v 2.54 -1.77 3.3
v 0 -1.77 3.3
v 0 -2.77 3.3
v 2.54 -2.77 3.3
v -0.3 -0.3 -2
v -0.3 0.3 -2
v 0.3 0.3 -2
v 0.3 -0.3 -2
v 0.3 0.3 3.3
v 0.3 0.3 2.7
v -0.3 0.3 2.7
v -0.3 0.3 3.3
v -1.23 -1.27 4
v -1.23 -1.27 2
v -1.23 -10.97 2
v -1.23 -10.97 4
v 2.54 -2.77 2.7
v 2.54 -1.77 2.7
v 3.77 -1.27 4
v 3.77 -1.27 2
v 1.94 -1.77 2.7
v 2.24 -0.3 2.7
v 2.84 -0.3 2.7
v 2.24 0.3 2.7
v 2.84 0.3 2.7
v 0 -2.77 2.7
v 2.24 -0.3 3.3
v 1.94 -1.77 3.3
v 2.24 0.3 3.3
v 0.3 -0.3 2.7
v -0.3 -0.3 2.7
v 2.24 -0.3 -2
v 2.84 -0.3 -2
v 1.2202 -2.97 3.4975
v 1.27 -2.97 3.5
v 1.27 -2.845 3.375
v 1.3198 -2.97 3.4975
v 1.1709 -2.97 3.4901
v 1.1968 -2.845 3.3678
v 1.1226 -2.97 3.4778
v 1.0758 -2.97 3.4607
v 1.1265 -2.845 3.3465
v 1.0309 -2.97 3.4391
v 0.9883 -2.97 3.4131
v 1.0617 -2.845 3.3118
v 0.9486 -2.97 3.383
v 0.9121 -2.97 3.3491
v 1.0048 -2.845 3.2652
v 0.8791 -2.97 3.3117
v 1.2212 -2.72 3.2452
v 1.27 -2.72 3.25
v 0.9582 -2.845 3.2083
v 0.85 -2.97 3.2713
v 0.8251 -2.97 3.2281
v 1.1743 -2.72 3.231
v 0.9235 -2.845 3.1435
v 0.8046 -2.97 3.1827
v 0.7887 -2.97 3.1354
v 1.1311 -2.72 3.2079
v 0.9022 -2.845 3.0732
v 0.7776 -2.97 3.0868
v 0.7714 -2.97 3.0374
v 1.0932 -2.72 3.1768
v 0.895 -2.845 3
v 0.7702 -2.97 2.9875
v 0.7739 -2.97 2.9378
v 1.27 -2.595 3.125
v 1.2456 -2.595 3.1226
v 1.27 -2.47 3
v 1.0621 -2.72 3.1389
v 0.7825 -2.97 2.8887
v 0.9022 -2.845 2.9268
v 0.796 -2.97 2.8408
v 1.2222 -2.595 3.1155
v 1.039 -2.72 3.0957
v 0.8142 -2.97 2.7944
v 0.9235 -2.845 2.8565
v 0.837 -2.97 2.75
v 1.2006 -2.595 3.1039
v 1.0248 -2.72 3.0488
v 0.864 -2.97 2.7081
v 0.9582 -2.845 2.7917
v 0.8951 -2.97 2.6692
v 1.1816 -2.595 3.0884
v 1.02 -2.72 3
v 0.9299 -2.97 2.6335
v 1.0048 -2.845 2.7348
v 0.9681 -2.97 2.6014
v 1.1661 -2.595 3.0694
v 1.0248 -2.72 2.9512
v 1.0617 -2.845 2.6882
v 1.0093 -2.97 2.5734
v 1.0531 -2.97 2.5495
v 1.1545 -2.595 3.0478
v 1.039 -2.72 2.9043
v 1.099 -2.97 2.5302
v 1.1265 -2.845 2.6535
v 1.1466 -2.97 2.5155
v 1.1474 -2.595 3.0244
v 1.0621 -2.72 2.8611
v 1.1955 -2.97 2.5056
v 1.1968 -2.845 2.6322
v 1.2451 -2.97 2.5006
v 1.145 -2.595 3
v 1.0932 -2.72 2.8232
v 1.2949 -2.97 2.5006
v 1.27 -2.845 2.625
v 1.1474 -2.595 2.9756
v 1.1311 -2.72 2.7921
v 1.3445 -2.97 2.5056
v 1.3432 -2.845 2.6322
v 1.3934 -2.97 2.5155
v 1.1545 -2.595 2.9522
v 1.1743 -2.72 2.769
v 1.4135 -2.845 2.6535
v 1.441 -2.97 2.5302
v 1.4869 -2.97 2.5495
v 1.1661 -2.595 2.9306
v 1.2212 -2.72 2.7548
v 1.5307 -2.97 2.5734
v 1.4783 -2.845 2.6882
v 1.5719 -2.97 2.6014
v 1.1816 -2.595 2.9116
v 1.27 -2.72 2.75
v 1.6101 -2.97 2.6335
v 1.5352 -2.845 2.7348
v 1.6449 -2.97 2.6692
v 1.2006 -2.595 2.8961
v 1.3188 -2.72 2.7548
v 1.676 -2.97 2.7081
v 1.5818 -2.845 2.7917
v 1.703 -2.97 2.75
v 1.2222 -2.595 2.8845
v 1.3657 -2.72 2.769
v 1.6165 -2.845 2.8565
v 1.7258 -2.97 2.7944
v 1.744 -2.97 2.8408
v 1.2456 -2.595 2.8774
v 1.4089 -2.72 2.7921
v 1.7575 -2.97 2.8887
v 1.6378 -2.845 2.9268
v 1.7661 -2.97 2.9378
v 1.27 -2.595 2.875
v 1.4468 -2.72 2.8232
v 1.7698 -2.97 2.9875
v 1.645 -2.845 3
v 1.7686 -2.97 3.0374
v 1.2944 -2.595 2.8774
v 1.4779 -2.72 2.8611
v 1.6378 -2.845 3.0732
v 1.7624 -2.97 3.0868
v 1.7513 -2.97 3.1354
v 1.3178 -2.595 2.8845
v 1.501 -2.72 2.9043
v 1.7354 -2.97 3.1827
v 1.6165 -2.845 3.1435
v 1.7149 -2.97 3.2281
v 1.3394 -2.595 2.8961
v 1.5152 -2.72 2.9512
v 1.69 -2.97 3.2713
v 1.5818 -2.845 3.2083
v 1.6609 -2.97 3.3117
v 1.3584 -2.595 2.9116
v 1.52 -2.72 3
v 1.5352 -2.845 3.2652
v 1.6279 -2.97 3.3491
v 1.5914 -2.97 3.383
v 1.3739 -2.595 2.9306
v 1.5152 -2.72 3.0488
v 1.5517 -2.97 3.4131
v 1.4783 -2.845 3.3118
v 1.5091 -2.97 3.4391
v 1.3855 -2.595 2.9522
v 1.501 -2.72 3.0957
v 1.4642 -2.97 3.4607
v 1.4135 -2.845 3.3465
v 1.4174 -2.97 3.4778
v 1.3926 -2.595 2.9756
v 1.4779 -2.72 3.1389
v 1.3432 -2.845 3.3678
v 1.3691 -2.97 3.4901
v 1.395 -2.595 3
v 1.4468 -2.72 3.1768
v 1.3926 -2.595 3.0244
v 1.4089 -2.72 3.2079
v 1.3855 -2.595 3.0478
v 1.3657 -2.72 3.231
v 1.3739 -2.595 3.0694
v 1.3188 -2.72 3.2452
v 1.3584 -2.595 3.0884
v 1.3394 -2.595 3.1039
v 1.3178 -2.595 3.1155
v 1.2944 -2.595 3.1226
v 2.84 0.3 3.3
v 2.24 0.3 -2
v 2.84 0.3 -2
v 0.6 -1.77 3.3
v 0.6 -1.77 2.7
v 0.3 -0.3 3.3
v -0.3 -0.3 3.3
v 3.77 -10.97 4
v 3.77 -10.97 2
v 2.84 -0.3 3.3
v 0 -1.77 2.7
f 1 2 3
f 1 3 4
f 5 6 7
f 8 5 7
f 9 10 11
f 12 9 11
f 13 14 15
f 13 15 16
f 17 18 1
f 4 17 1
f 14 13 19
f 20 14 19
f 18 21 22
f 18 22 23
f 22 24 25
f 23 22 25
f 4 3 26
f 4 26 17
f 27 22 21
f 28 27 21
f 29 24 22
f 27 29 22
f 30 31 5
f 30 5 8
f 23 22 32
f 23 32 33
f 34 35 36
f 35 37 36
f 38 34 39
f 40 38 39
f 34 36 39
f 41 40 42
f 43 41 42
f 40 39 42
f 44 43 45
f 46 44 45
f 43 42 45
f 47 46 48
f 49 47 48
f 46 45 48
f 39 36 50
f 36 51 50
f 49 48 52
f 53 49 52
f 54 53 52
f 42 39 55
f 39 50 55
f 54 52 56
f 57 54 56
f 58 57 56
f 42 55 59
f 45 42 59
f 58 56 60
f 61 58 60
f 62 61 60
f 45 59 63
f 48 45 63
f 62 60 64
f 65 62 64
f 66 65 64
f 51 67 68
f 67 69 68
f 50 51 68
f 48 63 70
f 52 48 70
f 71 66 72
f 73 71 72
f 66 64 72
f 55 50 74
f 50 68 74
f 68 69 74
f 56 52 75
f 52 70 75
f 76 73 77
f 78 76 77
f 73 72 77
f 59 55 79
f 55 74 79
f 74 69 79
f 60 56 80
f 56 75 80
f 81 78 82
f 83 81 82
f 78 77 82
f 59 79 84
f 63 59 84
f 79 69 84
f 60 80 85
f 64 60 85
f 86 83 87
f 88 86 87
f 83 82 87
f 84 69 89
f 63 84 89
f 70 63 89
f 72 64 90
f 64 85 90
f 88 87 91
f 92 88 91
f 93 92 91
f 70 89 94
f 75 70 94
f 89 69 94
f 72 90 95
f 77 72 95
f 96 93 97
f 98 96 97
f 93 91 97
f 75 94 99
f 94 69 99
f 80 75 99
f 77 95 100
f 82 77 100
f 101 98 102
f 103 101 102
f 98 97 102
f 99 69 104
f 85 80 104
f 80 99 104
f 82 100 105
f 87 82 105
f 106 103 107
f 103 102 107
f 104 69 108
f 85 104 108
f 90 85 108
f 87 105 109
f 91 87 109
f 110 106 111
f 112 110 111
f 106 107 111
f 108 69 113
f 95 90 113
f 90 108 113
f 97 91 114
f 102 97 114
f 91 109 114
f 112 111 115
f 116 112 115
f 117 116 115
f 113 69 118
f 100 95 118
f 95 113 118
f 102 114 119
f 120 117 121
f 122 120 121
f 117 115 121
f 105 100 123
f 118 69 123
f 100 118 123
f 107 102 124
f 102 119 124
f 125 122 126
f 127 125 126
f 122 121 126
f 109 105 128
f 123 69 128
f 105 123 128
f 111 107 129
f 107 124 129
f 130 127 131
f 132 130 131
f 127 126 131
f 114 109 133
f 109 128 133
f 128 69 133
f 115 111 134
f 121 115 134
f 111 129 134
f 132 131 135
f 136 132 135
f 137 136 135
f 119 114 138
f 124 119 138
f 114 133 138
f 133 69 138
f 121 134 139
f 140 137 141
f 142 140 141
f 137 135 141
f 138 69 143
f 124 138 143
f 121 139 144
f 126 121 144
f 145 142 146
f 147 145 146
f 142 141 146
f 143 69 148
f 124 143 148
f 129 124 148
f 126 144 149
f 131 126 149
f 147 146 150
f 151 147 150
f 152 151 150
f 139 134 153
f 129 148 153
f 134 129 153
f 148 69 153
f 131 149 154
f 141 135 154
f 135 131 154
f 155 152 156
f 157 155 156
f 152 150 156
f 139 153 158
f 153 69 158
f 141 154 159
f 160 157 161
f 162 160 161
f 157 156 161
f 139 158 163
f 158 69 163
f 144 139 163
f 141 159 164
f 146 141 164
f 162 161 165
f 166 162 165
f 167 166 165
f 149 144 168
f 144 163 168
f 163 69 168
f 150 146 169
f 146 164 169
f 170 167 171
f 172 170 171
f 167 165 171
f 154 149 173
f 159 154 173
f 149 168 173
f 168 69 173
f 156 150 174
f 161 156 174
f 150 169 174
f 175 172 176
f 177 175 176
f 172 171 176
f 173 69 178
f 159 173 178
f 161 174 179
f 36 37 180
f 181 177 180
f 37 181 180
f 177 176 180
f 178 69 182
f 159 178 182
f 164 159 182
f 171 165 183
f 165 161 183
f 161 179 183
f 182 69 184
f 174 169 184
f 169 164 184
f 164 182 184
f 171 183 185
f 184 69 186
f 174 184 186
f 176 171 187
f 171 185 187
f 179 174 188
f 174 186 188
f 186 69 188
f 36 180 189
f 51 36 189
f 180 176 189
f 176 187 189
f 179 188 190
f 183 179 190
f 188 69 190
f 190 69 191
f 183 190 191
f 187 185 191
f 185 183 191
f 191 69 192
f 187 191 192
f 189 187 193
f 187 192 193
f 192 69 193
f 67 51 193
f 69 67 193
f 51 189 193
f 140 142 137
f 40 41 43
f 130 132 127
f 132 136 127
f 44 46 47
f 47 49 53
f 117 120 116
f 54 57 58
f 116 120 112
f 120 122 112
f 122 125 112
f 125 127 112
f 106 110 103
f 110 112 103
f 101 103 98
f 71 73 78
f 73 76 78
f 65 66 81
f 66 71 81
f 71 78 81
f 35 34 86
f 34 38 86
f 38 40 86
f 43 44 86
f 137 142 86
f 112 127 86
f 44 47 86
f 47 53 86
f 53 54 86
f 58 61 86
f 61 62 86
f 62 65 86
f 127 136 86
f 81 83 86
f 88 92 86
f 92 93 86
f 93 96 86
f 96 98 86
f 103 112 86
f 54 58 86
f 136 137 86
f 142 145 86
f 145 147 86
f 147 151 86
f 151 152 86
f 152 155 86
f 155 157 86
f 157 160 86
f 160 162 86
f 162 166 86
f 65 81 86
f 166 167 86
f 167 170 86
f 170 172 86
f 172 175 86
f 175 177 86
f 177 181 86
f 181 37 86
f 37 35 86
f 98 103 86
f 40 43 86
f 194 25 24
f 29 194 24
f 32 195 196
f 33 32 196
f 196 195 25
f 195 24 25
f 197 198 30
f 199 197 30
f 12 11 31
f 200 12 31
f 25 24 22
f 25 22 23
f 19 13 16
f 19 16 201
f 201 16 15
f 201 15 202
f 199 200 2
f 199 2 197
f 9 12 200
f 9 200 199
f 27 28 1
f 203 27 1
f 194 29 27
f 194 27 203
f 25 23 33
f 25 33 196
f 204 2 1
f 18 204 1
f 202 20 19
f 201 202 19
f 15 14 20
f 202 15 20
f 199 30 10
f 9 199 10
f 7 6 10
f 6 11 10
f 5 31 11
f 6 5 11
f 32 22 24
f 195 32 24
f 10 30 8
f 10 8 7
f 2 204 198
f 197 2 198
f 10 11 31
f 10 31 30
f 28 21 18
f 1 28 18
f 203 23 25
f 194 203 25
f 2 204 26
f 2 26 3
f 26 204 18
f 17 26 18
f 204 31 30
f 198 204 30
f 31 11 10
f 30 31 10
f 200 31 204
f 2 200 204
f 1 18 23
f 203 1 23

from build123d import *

# Parameters (mm, degrees)
SKETCH_W       = 0.6
SKETCH_H       = 0.6
PAD_DEPTH      = 2.7
PAD_DEPTH_BACK = 2
PAD001_DEPTH   = 0.6
SKETCH002_W    = 2.54
SKETCH002_H    = 0.6
PAD002_DEPTH   = 1
SKETCH004_W    = 5
SKETCH004_H    = 2
PAD003_DEPTH   = 9.7


with BuildPart() as pad:
    # Sketch → Pad (new body, two sides)
    with BuildSketch(Plane.XY) as pad_sk:
        Rectangle(SKETCH_W, SKETCH_H)
        with Locations((2.54, 0)):
            Rectangle(SKETCH_W, SKETCH_H)
    extrude(amount=PAD_DEPTH)
    extrude(pad_sk.sketch, amount=-PAD_DEPTH_BACK)


with BuildPart() as pad001:
    # Sketch001 → Pad001 (new body)
    with BuildSketch(Plane.XY.offset(2.7)):
        Polygon((0.3, 0.3), (-0.3, 0.3), (-0.3, -0.3), (0, -1.77), (0.6, -1.77), (0.3, -0.3), align=None)
        Polygon((2.84, 0.3), (2.24, 0.3), (2.24, -0.3), (1.94, -1.77), (2.54, -1.77), (2.84, -0.3), align=None)
    extrude(amount=PAD001_DEPTH)


with BuildPart() as pad002:
    # Sketch002 → Pad002 (new body)
    with BuildSketch(Plane.XZ.offset(1.77)):
        with Locations((1.27, 3)):
            Rectangle(SKETCH002_W, SKETCH002_H)
    extrude(amount=PAD002_DEPTH)


with BuildPart() as pad003:
    # Sketch004 → Pad003 (new body)
    with BuildSketch(Plane.XZ.offset(1.27)):
        with Locations((1.27, 3)):
            Rectangle(SKETCH004_W, SKETCH004_H)
    extrude(amount=PAD003_DEPTH)


with BuildPart() as revolution001:
    # Sketch005 → Revolution001 (revolve)
    with BuildSketch(Plane.YZ.offset(1.27)):
        Polygon((-2.47, 3), (-2.97, 3), (-2.97, 3.5), align=None)
    revolve(axis=Axis((1.27, -3.977201, 3), (0, -1, 0)))


solid = Compound([pad.part, pad001.part, pad002.part, pad003.part, revolution001.part])
